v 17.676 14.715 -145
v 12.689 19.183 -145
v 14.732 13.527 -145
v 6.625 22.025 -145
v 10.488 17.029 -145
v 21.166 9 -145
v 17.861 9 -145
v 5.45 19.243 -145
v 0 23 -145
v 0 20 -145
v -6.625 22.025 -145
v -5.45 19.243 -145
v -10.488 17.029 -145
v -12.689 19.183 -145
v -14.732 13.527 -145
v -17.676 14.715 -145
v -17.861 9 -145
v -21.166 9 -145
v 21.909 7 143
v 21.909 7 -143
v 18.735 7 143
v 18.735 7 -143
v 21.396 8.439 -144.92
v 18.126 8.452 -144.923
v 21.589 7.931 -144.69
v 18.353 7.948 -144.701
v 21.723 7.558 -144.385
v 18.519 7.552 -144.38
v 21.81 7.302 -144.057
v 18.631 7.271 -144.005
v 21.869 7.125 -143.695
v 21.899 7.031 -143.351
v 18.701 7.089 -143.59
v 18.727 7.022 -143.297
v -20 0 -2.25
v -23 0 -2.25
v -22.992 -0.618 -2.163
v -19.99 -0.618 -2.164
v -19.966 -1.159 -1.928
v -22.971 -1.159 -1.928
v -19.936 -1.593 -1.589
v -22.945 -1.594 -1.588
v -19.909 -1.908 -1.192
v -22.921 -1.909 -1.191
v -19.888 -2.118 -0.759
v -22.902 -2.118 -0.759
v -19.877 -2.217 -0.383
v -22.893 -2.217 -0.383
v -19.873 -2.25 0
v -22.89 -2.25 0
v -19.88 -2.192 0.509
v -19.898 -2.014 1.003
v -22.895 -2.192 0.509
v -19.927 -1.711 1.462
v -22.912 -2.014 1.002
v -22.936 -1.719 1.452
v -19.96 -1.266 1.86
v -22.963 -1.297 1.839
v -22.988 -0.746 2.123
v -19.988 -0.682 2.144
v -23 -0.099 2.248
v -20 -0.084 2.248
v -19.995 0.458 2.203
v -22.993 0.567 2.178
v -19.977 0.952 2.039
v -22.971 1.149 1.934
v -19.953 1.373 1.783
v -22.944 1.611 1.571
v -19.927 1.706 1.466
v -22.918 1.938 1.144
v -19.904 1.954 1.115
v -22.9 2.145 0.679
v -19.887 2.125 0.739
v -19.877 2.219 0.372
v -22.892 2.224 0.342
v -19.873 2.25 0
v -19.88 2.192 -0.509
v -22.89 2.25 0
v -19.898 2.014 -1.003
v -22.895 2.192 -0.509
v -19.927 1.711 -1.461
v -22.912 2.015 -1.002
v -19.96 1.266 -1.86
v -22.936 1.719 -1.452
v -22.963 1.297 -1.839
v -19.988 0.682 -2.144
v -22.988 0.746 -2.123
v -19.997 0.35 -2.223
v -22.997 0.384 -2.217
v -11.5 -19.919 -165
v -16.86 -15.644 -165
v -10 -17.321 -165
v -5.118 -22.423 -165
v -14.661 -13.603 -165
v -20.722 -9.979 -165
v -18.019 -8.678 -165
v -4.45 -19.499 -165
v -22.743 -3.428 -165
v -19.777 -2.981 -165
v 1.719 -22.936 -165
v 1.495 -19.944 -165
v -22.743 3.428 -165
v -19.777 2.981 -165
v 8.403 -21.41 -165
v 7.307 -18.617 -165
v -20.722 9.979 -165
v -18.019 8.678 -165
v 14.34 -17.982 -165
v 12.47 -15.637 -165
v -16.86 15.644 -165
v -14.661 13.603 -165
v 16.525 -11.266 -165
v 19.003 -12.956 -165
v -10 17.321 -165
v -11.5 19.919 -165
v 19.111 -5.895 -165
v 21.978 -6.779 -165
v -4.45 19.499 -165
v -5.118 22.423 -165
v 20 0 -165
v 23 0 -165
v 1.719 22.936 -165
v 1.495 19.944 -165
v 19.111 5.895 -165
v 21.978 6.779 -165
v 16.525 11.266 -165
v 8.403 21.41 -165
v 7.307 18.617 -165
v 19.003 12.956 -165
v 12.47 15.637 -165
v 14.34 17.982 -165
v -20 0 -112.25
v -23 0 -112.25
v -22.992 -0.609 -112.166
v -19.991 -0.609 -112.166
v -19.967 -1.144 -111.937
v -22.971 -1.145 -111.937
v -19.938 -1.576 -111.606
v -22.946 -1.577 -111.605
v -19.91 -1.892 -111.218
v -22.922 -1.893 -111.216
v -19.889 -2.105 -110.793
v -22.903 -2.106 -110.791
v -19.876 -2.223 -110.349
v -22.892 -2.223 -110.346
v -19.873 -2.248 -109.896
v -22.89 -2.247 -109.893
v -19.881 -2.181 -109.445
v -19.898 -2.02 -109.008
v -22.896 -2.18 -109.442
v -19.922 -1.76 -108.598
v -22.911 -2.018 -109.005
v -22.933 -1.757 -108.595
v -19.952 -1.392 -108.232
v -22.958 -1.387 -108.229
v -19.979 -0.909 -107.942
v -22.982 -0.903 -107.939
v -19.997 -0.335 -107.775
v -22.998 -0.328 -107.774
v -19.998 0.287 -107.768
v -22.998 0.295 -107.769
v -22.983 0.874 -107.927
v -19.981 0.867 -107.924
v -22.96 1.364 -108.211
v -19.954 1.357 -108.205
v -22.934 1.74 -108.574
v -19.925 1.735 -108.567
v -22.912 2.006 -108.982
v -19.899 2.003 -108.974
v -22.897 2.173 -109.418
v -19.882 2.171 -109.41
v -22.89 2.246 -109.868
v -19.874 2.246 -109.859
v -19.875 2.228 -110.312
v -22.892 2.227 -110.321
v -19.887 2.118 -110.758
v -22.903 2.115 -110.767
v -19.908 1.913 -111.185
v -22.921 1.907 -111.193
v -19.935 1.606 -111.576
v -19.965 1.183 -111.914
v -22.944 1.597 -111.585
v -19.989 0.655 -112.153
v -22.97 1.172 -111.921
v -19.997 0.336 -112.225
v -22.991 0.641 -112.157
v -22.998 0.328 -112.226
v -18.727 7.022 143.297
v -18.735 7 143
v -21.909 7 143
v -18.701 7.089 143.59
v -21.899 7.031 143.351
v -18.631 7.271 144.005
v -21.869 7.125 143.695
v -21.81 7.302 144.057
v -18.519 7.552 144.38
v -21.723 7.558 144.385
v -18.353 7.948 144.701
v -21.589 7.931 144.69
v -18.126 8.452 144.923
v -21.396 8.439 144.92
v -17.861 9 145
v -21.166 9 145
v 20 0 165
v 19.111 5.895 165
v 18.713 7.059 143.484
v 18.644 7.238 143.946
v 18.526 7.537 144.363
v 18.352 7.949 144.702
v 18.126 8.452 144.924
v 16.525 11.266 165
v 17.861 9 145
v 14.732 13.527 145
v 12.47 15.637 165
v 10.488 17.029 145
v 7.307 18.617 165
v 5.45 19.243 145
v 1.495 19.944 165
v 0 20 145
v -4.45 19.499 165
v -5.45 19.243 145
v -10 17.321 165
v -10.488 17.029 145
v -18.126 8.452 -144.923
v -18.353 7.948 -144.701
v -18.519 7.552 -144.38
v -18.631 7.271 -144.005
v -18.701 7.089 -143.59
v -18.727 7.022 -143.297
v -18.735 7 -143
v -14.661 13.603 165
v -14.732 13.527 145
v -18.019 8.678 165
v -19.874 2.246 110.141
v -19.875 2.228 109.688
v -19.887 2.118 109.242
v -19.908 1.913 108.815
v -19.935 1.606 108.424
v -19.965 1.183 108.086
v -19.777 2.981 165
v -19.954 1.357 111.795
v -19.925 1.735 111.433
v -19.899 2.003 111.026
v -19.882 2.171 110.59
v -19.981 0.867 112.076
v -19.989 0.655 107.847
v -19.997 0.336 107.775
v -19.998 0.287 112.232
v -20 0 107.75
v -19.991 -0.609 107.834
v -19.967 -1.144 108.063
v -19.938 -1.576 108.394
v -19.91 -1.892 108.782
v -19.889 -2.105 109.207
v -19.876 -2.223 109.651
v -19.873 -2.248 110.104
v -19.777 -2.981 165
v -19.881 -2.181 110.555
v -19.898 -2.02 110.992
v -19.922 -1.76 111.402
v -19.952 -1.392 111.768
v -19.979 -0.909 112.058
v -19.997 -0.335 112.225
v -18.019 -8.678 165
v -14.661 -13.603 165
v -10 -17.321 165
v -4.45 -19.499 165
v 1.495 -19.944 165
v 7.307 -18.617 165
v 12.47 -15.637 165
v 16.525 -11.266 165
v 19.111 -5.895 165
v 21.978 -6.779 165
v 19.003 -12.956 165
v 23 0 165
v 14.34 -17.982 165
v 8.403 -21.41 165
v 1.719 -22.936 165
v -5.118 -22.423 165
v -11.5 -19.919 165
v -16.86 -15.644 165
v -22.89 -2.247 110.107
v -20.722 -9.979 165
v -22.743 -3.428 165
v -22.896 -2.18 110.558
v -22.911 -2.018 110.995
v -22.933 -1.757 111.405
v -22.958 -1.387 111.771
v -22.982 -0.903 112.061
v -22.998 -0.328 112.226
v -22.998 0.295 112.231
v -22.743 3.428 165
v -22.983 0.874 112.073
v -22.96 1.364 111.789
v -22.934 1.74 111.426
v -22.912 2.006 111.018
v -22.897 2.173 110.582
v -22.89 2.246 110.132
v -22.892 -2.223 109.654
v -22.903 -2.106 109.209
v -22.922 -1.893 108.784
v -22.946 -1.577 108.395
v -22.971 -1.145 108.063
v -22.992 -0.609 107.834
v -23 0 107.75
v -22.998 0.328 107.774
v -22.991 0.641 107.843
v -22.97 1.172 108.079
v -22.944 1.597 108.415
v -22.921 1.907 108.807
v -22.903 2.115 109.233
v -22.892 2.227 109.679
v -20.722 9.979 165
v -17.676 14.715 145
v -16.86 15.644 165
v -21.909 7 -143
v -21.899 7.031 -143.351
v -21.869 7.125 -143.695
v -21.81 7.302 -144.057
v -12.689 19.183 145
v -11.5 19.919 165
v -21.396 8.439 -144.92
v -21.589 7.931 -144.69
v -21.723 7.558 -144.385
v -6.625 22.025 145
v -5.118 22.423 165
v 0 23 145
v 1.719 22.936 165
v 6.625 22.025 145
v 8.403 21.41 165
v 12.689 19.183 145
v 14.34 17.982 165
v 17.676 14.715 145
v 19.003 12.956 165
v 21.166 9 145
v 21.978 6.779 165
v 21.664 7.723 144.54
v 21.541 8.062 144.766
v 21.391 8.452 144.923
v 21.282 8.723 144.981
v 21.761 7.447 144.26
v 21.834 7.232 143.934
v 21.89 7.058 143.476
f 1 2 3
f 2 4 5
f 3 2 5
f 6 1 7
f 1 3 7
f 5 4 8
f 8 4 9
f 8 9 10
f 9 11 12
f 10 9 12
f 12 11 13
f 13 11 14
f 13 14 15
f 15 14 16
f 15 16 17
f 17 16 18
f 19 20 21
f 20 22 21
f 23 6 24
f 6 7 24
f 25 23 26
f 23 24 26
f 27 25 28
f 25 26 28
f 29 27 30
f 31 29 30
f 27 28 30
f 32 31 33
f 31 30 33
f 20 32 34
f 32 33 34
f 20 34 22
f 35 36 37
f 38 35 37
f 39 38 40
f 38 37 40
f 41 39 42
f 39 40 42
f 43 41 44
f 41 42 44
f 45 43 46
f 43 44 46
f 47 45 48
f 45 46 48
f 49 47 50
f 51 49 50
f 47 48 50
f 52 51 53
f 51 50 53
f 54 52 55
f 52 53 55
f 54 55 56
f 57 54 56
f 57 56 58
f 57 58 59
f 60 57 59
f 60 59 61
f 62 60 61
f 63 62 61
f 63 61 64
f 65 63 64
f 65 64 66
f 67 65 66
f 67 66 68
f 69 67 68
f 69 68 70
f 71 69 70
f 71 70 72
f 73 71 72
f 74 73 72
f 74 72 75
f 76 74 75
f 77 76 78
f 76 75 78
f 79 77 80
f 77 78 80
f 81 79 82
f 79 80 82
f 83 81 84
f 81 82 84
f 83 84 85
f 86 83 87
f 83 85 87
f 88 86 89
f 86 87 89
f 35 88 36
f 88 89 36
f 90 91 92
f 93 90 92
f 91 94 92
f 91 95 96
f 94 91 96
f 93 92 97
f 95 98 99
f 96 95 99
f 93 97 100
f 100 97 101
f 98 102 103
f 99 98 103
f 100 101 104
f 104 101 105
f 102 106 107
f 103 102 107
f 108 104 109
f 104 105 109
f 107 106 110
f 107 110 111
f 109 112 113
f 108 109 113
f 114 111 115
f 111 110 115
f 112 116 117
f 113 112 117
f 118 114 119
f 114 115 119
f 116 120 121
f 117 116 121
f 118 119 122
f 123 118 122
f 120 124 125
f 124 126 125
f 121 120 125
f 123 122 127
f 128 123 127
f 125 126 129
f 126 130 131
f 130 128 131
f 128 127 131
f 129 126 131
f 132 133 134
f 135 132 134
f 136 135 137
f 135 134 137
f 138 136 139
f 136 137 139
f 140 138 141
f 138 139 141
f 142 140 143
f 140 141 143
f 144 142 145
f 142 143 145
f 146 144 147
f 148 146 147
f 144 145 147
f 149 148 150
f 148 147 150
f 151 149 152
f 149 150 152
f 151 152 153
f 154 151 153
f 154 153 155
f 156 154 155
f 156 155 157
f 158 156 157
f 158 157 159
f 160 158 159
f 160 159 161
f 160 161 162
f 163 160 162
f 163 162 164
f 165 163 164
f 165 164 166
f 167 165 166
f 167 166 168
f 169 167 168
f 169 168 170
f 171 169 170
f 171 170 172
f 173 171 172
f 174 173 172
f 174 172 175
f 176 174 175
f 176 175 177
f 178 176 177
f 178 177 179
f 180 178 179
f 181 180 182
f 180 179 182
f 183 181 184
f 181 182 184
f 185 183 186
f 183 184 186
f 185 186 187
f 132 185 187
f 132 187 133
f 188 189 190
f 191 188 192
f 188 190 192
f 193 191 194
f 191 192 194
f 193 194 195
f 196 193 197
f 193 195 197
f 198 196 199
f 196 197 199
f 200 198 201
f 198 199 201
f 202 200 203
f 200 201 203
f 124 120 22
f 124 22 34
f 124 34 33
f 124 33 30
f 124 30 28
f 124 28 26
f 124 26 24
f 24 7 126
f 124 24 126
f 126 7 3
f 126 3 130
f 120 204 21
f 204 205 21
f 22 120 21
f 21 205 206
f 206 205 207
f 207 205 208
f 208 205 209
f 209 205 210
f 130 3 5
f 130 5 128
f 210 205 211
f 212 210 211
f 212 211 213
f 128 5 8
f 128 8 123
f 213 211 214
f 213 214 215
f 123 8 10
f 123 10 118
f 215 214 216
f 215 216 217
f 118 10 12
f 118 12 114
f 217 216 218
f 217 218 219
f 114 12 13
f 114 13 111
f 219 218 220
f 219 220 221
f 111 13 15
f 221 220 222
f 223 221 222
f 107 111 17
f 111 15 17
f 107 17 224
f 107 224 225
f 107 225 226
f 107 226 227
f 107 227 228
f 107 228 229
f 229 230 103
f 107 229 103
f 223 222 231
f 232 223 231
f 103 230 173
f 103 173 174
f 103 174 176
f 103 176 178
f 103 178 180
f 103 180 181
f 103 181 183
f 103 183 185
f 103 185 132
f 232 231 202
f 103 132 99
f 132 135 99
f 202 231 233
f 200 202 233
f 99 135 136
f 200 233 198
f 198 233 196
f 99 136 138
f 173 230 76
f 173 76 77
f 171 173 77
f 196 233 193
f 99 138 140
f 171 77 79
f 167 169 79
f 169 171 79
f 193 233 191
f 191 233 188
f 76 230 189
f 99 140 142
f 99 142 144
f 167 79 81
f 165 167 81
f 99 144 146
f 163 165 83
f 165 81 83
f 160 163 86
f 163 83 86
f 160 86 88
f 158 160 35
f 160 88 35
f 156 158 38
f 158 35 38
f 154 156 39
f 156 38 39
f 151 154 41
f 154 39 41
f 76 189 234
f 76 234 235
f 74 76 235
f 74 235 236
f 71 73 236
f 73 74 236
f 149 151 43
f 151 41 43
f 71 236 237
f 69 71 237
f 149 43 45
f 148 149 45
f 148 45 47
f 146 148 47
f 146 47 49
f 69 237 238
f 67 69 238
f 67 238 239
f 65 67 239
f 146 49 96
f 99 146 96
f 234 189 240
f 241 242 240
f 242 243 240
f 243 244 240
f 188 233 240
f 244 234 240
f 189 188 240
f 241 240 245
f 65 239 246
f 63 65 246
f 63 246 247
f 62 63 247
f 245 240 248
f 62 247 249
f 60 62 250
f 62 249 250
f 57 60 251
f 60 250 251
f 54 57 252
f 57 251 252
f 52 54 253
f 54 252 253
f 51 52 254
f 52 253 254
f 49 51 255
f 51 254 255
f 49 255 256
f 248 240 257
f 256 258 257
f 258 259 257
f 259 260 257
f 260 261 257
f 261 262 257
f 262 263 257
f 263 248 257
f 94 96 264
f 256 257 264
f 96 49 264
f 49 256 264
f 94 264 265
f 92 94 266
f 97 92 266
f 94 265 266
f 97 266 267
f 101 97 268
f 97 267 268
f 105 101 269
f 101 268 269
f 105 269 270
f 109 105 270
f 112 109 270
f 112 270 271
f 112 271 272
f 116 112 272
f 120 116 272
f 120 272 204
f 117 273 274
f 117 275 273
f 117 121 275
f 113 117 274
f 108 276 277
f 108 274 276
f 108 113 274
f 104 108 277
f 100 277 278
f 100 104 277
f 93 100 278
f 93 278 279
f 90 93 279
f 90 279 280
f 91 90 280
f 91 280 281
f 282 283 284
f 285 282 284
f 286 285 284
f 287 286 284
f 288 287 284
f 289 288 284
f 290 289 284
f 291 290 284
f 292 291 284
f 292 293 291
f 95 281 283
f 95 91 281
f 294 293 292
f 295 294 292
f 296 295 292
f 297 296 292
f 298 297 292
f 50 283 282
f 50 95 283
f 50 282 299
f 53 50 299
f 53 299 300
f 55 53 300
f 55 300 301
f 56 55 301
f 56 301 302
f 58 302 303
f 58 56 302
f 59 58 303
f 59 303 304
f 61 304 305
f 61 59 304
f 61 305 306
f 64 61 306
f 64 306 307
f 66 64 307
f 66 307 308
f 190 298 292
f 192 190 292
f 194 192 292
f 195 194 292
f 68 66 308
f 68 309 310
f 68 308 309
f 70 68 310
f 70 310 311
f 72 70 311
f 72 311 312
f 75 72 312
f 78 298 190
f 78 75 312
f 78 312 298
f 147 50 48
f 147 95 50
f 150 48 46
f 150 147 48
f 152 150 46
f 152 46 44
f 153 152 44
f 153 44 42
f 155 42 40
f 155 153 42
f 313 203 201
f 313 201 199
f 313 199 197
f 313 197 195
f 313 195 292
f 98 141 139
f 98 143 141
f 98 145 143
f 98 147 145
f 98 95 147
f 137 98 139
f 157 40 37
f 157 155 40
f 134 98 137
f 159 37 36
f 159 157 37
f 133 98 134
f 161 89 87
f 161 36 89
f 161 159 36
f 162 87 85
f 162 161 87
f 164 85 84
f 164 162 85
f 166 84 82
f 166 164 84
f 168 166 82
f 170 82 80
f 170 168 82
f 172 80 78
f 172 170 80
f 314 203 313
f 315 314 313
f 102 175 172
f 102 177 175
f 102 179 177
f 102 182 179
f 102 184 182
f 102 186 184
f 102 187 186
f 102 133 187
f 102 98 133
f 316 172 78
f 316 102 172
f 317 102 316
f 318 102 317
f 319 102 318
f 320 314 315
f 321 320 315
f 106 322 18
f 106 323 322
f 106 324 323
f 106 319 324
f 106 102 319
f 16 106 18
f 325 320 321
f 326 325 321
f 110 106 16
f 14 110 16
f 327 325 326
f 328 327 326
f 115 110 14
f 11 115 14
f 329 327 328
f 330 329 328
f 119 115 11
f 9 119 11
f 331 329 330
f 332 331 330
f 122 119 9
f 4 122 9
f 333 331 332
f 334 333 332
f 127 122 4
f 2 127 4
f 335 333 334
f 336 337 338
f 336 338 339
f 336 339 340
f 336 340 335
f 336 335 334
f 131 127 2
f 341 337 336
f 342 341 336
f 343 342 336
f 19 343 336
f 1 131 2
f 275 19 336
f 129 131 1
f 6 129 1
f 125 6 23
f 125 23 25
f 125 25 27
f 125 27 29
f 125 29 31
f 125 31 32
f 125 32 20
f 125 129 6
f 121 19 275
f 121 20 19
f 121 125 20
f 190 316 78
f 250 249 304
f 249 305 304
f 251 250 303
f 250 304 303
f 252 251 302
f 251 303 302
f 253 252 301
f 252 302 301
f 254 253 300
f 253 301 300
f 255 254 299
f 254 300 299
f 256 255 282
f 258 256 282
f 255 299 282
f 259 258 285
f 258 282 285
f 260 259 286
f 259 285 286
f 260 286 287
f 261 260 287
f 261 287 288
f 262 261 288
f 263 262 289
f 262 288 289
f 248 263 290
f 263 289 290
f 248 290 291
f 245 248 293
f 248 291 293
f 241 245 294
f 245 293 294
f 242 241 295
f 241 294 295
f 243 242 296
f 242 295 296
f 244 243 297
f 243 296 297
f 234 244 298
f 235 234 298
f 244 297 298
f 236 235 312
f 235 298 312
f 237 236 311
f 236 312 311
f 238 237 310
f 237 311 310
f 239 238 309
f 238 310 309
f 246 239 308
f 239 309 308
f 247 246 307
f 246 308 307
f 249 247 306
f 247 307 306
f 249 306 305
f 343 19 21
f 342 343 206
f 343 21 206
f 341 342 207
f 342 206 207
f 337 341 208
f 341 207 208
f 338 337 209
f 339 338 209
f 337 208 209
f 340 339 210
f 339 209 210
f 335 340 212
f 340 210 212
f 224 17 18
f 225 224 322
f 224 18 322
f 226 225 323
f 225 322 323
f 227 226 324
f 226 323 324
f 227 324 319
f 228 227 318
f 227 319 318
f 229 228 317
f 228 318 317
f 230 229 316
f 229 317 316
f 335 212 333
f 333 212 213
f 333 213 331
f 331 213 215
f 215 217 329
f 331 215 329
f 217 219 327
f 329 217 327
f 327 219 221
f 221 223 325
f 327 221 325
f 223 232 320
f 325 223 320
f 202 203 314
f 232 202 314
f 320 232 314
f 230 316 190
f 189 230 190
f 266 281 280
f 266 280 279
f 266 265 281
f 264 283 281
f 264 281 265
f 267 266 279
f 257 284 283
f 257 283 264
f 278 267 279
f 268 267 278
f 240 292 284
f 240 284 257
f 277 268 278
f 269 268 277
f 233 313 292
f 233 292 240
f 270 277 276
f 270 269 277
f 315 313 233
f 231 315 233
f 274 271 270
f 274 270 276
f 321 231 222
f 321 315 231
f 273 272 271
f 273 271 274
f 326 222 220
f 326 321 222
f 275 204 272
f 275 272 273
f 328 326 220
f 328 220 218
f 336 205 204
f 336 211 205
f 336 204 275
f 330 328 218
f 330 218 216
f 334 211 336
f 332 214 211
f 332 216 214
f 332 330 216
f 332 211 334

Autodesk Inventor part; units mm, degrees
ref_plane "YZ Plane" through (0, 0, 0) normal (1, 0, 0) x (0, 1, 0)
ref_plane "XZ Plane" through (0, 0, 0) normal (0, 1, 0) x (-1, 0, 0)
ref_plane "XY Plane" through (0, 0, 0) normal (0, 0, 1) x (1, 0, 0)
sketch "Sketch1" plane through (0, 0, 0) normal (0, 0, 1) x (1, 0, 0)
  circle A0 centre (0, 0) radius 20
  circle A1 centre (0, 0) radius 23
  dimension "d0" = 40
  dimension "d1" = 46
extrude "Extrusion1" add sketch "Sketch1" along normal mid plane 330
sketch "Sketch2" plane through (0, 0, 0) normal (1, 0, 0) x (0, 1, 0)
  line L0 (0, 210) -> (0, -210) projected
  line L1 (-210, 0) -> (210, 0) projected
  point P0 (0, 0)
  point P1 (0, 110)
  point P2 (0, 0)
  point P3 (0, -110)
  dimension "d4" = 110
  dimension "d5" = 110
hole "Hole1" at (0, 0, 110) at (0, 0, 0) at (0, 0, -110) direction (-1, 0, 0) diameter 4.5 end through all clearance for "Flat Head Machine Screw" size "M4" standard "Ansi Metric M Profile"
sketch "Sketch3" plane through (0, 0, 0) normal (1, 0, 0) x (0, 1, 0)
  line L0 (23, -145) -> (7, -145)
  line L1 (7, -145) -> (7, 145)
  line L2 (7, 145) -> (23, 145)
  line L3 (23, 145) -> (23, -145)
  line L4 (23, 165) -> (-23, 165) projected
  line L5 (-23, -165) -> (23, -165) projected
  line L6 (0, 297.5) -> (0, -297.5) projected
  point P0 (0, 0)
  dimension "d13" = 20
  dimension "d14" = 20
  dimension "d15" = 7
extrude "Extrusion2" cut sketch "Sketch3" along normal through all both and the other way through all
fillet "Fillet1" radius 2 4 edges at (20.3219, 7, -145) (-20.3219, 7, -145) (20.3219, 7, 145) (-20.3219, 7, 145)
equation "\"d5\" = d4"
properties part number "Pancake_Tilt Pipe_3 Lanes" material "PVC-Piping"
